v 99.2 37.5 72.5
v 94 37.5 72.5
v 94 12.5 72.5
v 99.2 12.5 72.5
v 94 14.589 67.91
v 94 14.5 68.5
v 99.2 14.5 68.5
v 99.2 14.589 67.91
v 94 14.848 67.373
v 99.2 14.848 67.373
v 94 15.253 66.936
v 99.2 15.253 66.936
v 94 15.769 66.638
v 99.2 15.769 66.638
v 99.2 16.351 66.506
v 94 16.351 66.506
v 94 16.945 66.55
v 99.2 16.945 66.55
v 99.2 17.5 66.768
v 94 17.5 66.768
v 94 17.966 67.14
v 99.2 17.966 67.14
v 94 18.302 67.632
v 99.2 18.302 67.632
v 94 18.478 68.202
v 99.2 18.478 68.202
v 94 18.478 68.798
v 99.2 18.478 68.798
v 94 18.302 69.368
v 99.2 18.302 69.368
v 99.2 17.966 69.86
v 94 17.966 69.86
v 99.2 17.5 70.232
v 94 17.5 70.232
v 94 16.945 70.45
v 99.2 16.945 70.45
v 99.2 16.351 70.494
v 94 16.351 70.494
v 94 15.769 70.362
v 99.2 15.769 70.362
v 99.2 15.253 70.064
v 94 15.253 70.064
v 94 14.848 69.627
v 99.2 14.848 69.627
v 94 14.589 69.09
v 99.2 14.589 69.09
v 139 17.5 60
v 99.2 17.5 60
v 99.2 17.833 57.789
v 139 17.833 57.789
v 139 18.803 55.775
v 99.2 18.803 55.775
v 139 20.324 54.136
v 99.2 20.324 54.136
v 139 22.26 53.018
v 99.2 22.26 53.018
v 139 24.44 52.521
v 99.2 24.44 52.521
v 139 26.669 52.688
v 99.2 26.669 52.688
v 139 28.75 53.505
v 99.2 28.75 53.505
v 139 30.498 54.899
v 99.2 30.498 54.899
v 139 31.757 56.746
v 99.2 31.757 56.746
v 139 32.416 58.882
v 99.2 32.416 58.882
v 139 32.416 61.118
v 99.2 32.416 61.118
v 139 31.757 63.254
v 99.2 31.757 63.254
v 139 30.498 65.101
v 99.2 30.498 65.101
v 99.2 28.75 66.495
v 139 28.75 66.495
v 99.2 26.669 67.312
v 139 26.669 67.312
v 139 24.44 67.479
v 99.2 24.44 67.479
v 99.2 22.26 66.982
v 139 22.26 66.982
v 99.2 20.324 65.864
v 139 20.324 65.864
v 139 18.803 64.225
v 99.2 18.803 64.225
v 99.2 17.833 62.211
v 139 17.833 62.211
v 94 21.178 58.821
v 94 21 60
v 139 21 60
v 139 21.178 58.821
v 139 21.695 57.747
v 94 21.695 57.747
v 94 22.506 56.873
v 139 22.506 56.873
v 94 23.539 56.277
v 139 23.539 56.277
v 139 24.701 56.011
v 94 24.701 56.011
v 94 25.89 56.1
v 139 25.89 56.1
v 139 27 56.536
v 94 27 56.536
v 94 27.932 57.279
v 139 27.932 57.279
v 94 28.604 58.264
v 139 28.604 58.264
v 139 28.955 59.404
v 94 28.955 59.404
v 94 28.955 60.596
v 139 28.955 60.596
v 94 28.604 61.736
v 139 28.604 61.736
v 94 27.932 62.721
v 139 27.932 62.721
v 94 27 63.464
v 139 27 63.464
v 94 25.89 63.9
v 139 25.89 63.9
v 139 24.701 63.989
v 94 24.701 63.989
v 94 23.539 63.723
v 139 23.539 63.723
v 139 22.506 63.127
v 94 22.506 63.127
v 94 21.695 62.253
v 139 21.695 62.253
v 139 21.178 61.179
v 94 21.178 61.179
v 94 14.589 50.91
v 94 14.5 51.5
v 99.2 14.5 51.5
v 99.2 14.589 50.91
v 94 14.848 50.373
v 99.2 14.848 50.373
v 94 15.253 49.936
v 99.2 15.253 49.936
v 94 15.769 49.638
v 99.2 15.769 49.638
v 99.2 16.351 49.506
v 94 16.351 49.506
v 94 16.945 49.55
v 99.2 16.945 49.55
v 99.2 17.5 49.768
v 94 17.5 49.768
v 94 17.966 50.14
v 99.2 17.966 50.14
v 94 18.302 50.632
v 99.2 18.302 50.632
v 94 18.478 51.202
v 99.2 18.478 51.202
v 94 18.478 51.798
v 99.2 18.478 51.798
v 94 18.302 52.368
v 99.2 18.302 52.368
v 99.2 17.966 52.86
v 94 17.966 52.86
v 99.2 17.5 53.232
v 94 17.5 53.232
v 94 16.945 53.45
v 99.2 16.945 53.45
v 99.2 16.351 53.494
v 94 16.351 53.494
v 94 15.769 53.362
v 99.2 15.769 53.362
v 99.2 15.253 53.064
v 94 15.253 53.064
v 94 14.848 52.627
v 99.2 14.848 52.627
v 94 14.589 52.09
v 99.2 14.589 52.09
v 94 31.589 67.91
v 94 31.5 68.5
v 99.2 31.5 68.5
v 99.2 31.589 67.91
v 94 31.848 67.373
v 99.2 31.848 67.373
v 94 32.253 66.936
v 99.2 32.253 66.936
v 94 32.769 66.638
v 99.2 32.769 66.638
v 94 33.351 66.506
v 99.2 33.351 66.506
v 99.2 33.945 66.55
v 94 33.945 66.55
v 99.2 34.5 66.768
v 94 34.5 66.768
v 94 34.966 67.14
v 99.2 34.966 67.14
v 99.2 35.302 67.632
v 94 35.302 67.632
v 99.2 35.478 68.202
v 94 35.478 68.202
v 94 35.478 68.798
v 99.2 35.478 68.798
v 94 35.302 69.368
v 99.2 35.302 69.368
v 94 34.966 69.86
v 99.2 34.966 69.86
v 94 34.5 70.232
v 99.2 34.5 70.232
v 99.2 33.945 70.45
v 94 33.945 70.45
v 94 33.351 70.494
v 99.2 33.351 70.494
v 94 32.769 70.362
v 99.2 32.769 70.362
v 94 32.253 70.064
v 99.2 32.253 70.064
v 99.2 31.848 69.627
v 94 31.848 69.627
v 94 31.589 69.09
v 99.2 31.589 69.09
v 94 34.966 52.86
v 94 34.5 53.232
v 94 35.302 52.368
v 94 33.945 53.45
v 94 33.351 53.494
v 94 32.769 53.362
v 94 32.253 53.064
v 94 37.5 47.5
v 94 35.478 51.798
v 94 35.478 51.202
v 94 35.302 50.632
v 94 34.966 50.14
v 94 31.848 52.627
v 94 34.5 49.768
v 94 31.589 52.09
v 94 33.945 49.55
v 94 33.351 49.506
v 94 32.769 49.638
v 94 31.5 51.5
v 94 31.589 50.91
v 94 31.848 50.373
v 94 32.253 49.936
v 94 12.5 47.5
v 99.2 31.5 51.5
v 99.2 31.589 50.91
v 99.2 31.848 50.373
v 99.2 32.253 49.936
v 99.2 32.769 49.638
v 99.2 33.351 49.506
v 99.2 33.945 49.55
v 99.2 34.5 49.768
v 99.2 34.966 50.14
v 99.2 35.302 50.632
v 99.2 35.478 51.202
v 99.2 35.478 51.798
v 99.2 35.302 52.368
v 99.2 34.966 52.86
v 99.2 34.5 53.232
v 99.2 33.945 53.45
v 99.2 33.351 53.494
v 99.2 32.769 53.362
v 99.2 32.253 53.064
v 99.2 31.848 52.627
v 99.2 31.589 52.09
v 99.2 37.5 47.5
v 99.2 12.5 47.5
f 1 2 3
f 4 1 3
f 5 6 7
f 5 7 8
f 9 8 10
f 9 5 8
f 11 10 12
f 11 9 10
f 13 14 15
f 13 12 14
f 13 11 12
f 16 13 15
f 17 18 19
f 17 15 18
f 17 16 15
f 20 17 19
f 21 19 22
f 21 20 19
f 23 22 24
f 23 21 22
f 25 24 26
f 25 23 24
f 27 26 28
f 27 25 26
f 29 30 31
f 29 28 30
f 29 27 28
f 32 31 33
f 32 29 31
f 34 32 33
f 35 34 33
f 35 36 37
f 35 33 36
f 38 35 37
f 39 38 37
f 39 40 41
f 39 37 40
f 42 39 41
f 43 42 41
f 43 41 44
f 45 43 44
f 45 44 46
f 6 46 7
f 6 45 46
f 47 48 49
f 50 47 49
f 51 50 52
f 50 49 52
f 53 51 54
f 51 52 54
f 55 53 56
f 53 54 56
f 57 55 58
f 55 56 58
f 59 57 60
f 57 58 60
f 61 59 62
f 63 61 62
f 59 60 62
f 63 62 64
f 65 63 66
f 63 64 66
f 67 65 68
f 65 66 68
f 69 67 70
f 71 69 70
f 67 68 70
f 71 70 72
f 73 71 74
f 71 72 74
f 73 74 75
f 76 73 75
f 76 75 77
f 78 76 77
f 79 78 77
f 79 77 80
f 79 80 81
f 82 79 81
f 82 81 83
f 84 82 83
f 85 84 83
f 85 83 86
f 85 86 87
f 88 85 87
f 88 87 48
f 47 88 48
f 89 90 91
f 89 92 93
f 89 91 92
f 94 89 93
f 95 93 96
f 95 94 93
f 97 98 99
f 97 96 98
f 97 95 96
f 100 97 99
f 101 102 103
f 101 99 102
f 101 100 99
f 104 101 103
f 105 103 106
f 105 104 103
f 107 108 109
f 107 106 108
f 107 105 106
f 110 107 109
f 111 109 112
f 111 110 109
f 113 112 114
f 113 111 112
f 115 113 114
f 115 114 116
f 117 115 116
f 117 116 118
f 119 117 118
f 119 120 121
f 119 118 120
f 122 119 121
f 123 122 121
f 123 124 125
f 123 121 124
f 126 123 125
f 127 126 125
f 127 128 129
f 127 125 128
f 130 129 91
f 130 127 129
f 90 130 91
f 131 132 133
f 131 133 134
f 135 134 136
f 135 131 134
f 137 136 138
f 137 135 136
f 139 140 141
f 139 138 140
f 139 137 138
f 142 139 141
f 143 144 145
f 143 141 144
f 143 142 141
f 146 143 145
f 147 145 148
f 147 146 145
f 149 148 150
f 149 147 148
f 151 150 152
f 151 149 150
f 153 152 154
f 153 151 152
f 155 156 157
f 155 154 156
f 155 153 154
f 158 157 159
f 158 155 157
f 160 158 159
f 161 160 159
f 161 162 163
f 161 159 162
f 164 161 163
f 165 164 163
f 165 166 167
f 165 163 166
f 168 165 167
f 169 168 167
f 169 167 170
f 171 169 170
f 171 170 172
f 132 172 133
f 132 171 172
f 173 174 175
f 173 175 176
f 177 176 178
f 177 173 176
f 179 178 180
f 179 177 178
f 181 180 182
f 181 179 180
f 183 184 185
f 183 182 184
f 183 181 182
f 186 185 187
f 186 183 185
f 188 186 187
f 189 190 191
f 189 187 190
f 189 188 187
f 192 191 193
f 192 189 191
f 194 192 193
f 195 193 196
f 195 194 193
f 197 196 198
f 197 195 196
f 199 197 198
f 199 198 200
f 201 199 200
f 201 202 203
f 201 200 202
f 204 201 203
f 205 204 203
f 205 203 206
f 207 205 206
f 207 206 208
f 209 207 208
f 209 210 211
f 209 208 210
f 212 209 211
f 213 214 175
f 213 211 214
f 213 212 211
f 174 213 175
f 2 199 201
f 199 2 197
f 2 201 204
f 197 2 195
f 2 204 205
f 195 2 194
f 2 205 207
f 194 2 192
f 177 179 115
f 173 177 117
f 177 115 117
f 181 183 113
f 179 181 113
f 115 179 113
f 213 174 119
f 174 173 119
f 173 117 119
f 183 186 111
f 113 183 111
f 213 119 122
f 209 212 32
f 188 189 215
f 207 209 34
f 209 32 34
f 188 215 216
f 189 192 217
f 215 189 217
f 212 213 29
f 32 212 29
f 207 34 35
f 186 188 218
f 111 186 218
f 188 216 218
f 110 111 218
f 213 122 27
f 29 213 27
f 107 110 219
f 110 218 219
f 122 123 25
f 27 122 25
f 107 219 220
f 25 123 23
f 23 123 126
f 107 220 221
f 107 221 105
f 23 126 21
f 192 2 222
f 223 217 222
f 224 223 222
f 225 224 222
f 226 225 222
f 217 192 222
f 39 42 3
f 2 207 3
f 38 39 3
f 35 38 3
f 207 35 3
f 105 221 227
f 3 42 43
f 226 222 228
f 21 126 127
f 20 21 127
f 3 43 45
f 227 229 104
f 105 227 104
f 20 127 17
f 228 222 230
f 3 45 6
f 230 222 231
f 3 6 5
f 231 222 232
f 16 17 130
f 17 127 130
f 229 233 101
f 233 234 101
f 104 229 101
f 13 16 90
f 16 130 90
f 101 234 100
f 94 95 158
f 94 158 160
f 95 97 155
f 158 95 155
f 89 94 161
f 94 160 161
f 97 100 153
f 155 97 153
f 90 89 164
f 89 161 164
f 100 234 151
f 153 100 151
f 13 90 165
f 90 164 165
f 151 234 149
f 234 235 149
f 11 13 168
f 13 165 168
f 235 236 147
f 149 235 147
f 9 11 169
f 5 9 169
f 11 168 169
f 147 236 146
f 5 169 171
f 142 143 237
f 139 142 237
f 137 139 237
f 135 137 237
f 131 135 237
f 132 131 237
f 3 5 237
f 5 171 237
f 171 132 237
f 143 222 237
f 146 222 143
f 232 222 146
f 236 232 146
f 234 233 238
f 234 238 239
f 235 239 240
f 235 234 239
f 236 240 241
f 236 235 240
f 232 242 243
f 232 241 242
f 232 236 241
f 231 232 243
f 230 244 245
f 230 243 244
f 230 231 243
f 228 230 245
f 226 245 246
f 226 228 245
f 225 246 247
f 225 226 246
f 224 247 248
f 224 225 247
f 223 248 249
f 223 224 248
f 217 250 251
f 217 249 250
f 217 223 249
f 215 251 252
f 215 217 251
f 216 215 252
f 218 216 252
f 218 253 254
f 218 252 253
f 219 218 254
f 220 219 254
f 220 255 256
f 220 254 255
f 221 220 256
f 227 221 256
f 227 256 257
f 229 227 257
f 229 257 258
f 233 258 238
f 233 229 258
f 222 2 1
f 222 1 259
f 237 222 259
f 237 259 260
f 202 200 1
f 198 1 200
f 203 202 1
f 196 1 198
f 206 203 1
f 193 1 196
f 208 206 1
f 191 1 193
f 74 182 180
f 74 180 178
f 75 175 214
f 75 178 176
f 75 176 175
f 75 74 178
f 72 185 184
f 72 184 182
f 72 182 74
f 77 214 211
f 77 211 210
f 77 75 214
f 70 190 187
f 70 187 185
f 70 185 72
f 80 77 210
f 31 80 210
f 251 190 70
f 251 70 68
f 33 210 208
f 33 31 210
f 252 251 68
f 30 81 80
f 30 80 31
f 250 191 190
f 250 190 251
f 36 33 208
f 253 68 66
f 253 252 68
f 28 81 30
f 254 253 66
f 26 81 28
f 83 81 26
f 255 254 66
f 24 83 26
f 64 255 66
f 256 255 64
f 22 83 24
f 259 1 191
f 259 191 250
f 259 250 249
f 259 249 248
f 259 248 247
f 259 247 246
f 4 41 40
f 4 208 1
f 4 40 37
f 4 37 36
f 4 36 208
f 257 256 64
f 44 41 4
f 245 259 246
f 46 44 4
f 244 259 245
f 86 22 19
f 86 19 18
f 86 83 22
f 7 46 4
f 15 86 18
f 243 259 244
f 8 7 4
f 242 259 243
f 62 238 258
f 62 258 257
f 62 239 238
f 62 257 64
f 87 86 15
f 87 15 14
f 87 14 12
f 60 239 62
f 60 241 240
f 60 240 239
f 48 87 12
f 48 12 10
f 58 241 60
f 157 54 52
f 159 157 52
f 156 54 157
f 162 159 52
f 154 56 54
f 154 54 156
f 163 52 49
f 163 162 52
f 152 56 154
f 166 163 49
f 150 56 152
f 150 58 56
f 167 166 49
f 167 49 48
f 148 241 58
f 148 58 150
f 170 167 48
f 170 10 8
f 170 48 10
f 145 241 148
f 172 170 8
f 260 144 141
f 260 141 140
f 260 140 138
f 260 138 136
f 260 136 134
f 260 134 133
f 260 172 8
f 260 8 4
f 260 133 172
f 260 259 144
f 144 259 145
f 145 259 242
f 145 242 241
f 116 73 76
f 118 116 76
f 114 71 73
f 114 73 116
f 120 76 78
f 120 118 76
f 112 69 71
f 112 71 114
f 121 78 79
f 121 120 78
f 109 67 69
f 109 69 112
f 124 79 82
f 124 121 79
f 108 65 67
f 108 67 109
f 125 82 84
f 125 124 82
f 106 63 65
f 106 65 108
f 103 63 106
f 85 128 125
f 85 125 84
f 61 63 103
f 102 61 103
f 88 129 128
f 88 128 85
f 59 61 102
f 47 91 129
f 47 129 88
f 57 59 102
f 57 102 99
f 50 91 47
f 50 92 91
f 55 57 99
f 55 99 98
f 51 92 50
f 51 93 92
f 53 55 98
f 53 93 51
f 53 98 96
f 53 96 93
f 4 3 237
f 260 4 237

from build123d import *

# Parameters (mm, degrees)
CYLINDER043_R          = 2
CYLINDER043_DEPTH      = 10
CYLINDER044_R          = 2
CYLINDER044_DEPTH      = 10
CYLINDER042_R          = 2
CYLINDER042_DEPTH      = 10
CYLINDER041_R          = 2
CYLINDER041_DEPTH      = 10
CYLINDER040_R          = 4
CYLINDER040_DEPTH      = 60
CYLINDER045_R          = 7.5
CYLINDER045_DEPTH      = 40
BOX008_W               = 25
BOX008_H               = 25
BOX008_DEPTH           = 5.2
CUT038_ROLL_ANGLE      = -90
CUT038_PLACEMENT_ANGLE = -90


with BuildPart() as cylinder043:
    # Cylinder043 → Cylinder043 (new body)
    with BuildSketch(Plane(origin=(21, 21, -2), x_dir=(1, 0, 0), z_dir=(0, 0, 1))):
        Circle(CYLINDER043_R)
    extrude(amount=CYLINDER043_DEPTH)


with BuildPart() as cylinder044:
    # Cylinder044 → Cylinder044 (new body)
    with BuildSketch(Plane(origin=(21, 4, -2), x_dir=(1, 0, 0), z_dir=(0, 0, 1))):
        Circle(CYLINDER044_R)
    extrude(amount=CYLINDER044_DEPTH)


with BuildPart() as cylinder042:
    # Cylinder042 → Cylinder042 (new body)
    with BuildSketch(Plane(origin=(4, 21, -2), x_dir=(1, 0, 0), z_dir=(0, 0, 1))):
        Circle(CYLINDER042_R)
    extrude(amount=CYLINDER042_DEPTH)


with BuildPart() as cylinder041:
    # Cylinder041 → Cylinder041 (new body)
    with BuildSketch(Plane(origin=(4, 4, -2), x_dir=(1, 0, 0), z_dir=(0, 0, 1))):
        Circle(CYLINDER041_R)
    extrude(amount=CYLINDER041_DEPTH)


with BuildPart() as cylinder040:
    # Cylinder040 → Cylinder040 (new body)
    with BuildSketch(Plane(origin=(12.5, 12.5, -7), x_dir=(1, 0, 0), z_dir=(0, 0, 1))):
        Circle(CYLINDER040_R)
    extrude(amount=CYLINDER040_DEPTH)


with BuildPart() as cylinder045:
    # Cylinder045 → Cylinder045 (new body)
    with BuildSketch(Plane(origin=(12.5, 12.5, 5), x_dir=(1, 0, 0), z_dir=(0, 0, 1))):
        Circle(CYLINDER045_R)
    extrude(amount=CYLINDER045_DEPTH)


with BuildPart() as cut038:
    # Box008 → Box008 (new body)
    with BuildSketch(Plane.XY):
        with Locations((12.5, 12.5)):
            Rectangle(BOX008_W, BOX008_H)
    extrude(amount=BOX008_DEPTH)

    # Fusion009: union Cylinder045
    add(cylinder045.part)

    # Cut037: cut Cylinder040
    add(cylinder040.part, mode=Mode.SUBTRACT)

    # Cut036: cut Cylinder041
    add(cylinder041.part, mode=Mode.SUBTRACT)

    # Cut035: cut Cylinder042
    add(cylinder042.part, mode=Mode.SUBTRACT)

    # Cut034: cut Cylinder044
    add(cylinder044.part, mode=Mode.SUBTRACT)

    # Cut038: cut Cylinder043
    add(cylinder043.part, mode=Mode.SUBTRACT)


with BuildPart() as cut038_1:
    # Cut038 roll: moved
    add(cut038.part.rotate(Axis((0, 0, 0), (1, 0, 0)), CUT038_ROLL_ANGLE))


with BuildPart() as cut038_2:
    # Cut038 placement: moved
    add(cut038_1.part.moved(Location((94, 37.5, 72.5))).rotate(Axis((94, 37.5, 72.5), (0, 0, 1)), CUT038_PLACEMENT_ANGLE))


solid = cut038_2.part
